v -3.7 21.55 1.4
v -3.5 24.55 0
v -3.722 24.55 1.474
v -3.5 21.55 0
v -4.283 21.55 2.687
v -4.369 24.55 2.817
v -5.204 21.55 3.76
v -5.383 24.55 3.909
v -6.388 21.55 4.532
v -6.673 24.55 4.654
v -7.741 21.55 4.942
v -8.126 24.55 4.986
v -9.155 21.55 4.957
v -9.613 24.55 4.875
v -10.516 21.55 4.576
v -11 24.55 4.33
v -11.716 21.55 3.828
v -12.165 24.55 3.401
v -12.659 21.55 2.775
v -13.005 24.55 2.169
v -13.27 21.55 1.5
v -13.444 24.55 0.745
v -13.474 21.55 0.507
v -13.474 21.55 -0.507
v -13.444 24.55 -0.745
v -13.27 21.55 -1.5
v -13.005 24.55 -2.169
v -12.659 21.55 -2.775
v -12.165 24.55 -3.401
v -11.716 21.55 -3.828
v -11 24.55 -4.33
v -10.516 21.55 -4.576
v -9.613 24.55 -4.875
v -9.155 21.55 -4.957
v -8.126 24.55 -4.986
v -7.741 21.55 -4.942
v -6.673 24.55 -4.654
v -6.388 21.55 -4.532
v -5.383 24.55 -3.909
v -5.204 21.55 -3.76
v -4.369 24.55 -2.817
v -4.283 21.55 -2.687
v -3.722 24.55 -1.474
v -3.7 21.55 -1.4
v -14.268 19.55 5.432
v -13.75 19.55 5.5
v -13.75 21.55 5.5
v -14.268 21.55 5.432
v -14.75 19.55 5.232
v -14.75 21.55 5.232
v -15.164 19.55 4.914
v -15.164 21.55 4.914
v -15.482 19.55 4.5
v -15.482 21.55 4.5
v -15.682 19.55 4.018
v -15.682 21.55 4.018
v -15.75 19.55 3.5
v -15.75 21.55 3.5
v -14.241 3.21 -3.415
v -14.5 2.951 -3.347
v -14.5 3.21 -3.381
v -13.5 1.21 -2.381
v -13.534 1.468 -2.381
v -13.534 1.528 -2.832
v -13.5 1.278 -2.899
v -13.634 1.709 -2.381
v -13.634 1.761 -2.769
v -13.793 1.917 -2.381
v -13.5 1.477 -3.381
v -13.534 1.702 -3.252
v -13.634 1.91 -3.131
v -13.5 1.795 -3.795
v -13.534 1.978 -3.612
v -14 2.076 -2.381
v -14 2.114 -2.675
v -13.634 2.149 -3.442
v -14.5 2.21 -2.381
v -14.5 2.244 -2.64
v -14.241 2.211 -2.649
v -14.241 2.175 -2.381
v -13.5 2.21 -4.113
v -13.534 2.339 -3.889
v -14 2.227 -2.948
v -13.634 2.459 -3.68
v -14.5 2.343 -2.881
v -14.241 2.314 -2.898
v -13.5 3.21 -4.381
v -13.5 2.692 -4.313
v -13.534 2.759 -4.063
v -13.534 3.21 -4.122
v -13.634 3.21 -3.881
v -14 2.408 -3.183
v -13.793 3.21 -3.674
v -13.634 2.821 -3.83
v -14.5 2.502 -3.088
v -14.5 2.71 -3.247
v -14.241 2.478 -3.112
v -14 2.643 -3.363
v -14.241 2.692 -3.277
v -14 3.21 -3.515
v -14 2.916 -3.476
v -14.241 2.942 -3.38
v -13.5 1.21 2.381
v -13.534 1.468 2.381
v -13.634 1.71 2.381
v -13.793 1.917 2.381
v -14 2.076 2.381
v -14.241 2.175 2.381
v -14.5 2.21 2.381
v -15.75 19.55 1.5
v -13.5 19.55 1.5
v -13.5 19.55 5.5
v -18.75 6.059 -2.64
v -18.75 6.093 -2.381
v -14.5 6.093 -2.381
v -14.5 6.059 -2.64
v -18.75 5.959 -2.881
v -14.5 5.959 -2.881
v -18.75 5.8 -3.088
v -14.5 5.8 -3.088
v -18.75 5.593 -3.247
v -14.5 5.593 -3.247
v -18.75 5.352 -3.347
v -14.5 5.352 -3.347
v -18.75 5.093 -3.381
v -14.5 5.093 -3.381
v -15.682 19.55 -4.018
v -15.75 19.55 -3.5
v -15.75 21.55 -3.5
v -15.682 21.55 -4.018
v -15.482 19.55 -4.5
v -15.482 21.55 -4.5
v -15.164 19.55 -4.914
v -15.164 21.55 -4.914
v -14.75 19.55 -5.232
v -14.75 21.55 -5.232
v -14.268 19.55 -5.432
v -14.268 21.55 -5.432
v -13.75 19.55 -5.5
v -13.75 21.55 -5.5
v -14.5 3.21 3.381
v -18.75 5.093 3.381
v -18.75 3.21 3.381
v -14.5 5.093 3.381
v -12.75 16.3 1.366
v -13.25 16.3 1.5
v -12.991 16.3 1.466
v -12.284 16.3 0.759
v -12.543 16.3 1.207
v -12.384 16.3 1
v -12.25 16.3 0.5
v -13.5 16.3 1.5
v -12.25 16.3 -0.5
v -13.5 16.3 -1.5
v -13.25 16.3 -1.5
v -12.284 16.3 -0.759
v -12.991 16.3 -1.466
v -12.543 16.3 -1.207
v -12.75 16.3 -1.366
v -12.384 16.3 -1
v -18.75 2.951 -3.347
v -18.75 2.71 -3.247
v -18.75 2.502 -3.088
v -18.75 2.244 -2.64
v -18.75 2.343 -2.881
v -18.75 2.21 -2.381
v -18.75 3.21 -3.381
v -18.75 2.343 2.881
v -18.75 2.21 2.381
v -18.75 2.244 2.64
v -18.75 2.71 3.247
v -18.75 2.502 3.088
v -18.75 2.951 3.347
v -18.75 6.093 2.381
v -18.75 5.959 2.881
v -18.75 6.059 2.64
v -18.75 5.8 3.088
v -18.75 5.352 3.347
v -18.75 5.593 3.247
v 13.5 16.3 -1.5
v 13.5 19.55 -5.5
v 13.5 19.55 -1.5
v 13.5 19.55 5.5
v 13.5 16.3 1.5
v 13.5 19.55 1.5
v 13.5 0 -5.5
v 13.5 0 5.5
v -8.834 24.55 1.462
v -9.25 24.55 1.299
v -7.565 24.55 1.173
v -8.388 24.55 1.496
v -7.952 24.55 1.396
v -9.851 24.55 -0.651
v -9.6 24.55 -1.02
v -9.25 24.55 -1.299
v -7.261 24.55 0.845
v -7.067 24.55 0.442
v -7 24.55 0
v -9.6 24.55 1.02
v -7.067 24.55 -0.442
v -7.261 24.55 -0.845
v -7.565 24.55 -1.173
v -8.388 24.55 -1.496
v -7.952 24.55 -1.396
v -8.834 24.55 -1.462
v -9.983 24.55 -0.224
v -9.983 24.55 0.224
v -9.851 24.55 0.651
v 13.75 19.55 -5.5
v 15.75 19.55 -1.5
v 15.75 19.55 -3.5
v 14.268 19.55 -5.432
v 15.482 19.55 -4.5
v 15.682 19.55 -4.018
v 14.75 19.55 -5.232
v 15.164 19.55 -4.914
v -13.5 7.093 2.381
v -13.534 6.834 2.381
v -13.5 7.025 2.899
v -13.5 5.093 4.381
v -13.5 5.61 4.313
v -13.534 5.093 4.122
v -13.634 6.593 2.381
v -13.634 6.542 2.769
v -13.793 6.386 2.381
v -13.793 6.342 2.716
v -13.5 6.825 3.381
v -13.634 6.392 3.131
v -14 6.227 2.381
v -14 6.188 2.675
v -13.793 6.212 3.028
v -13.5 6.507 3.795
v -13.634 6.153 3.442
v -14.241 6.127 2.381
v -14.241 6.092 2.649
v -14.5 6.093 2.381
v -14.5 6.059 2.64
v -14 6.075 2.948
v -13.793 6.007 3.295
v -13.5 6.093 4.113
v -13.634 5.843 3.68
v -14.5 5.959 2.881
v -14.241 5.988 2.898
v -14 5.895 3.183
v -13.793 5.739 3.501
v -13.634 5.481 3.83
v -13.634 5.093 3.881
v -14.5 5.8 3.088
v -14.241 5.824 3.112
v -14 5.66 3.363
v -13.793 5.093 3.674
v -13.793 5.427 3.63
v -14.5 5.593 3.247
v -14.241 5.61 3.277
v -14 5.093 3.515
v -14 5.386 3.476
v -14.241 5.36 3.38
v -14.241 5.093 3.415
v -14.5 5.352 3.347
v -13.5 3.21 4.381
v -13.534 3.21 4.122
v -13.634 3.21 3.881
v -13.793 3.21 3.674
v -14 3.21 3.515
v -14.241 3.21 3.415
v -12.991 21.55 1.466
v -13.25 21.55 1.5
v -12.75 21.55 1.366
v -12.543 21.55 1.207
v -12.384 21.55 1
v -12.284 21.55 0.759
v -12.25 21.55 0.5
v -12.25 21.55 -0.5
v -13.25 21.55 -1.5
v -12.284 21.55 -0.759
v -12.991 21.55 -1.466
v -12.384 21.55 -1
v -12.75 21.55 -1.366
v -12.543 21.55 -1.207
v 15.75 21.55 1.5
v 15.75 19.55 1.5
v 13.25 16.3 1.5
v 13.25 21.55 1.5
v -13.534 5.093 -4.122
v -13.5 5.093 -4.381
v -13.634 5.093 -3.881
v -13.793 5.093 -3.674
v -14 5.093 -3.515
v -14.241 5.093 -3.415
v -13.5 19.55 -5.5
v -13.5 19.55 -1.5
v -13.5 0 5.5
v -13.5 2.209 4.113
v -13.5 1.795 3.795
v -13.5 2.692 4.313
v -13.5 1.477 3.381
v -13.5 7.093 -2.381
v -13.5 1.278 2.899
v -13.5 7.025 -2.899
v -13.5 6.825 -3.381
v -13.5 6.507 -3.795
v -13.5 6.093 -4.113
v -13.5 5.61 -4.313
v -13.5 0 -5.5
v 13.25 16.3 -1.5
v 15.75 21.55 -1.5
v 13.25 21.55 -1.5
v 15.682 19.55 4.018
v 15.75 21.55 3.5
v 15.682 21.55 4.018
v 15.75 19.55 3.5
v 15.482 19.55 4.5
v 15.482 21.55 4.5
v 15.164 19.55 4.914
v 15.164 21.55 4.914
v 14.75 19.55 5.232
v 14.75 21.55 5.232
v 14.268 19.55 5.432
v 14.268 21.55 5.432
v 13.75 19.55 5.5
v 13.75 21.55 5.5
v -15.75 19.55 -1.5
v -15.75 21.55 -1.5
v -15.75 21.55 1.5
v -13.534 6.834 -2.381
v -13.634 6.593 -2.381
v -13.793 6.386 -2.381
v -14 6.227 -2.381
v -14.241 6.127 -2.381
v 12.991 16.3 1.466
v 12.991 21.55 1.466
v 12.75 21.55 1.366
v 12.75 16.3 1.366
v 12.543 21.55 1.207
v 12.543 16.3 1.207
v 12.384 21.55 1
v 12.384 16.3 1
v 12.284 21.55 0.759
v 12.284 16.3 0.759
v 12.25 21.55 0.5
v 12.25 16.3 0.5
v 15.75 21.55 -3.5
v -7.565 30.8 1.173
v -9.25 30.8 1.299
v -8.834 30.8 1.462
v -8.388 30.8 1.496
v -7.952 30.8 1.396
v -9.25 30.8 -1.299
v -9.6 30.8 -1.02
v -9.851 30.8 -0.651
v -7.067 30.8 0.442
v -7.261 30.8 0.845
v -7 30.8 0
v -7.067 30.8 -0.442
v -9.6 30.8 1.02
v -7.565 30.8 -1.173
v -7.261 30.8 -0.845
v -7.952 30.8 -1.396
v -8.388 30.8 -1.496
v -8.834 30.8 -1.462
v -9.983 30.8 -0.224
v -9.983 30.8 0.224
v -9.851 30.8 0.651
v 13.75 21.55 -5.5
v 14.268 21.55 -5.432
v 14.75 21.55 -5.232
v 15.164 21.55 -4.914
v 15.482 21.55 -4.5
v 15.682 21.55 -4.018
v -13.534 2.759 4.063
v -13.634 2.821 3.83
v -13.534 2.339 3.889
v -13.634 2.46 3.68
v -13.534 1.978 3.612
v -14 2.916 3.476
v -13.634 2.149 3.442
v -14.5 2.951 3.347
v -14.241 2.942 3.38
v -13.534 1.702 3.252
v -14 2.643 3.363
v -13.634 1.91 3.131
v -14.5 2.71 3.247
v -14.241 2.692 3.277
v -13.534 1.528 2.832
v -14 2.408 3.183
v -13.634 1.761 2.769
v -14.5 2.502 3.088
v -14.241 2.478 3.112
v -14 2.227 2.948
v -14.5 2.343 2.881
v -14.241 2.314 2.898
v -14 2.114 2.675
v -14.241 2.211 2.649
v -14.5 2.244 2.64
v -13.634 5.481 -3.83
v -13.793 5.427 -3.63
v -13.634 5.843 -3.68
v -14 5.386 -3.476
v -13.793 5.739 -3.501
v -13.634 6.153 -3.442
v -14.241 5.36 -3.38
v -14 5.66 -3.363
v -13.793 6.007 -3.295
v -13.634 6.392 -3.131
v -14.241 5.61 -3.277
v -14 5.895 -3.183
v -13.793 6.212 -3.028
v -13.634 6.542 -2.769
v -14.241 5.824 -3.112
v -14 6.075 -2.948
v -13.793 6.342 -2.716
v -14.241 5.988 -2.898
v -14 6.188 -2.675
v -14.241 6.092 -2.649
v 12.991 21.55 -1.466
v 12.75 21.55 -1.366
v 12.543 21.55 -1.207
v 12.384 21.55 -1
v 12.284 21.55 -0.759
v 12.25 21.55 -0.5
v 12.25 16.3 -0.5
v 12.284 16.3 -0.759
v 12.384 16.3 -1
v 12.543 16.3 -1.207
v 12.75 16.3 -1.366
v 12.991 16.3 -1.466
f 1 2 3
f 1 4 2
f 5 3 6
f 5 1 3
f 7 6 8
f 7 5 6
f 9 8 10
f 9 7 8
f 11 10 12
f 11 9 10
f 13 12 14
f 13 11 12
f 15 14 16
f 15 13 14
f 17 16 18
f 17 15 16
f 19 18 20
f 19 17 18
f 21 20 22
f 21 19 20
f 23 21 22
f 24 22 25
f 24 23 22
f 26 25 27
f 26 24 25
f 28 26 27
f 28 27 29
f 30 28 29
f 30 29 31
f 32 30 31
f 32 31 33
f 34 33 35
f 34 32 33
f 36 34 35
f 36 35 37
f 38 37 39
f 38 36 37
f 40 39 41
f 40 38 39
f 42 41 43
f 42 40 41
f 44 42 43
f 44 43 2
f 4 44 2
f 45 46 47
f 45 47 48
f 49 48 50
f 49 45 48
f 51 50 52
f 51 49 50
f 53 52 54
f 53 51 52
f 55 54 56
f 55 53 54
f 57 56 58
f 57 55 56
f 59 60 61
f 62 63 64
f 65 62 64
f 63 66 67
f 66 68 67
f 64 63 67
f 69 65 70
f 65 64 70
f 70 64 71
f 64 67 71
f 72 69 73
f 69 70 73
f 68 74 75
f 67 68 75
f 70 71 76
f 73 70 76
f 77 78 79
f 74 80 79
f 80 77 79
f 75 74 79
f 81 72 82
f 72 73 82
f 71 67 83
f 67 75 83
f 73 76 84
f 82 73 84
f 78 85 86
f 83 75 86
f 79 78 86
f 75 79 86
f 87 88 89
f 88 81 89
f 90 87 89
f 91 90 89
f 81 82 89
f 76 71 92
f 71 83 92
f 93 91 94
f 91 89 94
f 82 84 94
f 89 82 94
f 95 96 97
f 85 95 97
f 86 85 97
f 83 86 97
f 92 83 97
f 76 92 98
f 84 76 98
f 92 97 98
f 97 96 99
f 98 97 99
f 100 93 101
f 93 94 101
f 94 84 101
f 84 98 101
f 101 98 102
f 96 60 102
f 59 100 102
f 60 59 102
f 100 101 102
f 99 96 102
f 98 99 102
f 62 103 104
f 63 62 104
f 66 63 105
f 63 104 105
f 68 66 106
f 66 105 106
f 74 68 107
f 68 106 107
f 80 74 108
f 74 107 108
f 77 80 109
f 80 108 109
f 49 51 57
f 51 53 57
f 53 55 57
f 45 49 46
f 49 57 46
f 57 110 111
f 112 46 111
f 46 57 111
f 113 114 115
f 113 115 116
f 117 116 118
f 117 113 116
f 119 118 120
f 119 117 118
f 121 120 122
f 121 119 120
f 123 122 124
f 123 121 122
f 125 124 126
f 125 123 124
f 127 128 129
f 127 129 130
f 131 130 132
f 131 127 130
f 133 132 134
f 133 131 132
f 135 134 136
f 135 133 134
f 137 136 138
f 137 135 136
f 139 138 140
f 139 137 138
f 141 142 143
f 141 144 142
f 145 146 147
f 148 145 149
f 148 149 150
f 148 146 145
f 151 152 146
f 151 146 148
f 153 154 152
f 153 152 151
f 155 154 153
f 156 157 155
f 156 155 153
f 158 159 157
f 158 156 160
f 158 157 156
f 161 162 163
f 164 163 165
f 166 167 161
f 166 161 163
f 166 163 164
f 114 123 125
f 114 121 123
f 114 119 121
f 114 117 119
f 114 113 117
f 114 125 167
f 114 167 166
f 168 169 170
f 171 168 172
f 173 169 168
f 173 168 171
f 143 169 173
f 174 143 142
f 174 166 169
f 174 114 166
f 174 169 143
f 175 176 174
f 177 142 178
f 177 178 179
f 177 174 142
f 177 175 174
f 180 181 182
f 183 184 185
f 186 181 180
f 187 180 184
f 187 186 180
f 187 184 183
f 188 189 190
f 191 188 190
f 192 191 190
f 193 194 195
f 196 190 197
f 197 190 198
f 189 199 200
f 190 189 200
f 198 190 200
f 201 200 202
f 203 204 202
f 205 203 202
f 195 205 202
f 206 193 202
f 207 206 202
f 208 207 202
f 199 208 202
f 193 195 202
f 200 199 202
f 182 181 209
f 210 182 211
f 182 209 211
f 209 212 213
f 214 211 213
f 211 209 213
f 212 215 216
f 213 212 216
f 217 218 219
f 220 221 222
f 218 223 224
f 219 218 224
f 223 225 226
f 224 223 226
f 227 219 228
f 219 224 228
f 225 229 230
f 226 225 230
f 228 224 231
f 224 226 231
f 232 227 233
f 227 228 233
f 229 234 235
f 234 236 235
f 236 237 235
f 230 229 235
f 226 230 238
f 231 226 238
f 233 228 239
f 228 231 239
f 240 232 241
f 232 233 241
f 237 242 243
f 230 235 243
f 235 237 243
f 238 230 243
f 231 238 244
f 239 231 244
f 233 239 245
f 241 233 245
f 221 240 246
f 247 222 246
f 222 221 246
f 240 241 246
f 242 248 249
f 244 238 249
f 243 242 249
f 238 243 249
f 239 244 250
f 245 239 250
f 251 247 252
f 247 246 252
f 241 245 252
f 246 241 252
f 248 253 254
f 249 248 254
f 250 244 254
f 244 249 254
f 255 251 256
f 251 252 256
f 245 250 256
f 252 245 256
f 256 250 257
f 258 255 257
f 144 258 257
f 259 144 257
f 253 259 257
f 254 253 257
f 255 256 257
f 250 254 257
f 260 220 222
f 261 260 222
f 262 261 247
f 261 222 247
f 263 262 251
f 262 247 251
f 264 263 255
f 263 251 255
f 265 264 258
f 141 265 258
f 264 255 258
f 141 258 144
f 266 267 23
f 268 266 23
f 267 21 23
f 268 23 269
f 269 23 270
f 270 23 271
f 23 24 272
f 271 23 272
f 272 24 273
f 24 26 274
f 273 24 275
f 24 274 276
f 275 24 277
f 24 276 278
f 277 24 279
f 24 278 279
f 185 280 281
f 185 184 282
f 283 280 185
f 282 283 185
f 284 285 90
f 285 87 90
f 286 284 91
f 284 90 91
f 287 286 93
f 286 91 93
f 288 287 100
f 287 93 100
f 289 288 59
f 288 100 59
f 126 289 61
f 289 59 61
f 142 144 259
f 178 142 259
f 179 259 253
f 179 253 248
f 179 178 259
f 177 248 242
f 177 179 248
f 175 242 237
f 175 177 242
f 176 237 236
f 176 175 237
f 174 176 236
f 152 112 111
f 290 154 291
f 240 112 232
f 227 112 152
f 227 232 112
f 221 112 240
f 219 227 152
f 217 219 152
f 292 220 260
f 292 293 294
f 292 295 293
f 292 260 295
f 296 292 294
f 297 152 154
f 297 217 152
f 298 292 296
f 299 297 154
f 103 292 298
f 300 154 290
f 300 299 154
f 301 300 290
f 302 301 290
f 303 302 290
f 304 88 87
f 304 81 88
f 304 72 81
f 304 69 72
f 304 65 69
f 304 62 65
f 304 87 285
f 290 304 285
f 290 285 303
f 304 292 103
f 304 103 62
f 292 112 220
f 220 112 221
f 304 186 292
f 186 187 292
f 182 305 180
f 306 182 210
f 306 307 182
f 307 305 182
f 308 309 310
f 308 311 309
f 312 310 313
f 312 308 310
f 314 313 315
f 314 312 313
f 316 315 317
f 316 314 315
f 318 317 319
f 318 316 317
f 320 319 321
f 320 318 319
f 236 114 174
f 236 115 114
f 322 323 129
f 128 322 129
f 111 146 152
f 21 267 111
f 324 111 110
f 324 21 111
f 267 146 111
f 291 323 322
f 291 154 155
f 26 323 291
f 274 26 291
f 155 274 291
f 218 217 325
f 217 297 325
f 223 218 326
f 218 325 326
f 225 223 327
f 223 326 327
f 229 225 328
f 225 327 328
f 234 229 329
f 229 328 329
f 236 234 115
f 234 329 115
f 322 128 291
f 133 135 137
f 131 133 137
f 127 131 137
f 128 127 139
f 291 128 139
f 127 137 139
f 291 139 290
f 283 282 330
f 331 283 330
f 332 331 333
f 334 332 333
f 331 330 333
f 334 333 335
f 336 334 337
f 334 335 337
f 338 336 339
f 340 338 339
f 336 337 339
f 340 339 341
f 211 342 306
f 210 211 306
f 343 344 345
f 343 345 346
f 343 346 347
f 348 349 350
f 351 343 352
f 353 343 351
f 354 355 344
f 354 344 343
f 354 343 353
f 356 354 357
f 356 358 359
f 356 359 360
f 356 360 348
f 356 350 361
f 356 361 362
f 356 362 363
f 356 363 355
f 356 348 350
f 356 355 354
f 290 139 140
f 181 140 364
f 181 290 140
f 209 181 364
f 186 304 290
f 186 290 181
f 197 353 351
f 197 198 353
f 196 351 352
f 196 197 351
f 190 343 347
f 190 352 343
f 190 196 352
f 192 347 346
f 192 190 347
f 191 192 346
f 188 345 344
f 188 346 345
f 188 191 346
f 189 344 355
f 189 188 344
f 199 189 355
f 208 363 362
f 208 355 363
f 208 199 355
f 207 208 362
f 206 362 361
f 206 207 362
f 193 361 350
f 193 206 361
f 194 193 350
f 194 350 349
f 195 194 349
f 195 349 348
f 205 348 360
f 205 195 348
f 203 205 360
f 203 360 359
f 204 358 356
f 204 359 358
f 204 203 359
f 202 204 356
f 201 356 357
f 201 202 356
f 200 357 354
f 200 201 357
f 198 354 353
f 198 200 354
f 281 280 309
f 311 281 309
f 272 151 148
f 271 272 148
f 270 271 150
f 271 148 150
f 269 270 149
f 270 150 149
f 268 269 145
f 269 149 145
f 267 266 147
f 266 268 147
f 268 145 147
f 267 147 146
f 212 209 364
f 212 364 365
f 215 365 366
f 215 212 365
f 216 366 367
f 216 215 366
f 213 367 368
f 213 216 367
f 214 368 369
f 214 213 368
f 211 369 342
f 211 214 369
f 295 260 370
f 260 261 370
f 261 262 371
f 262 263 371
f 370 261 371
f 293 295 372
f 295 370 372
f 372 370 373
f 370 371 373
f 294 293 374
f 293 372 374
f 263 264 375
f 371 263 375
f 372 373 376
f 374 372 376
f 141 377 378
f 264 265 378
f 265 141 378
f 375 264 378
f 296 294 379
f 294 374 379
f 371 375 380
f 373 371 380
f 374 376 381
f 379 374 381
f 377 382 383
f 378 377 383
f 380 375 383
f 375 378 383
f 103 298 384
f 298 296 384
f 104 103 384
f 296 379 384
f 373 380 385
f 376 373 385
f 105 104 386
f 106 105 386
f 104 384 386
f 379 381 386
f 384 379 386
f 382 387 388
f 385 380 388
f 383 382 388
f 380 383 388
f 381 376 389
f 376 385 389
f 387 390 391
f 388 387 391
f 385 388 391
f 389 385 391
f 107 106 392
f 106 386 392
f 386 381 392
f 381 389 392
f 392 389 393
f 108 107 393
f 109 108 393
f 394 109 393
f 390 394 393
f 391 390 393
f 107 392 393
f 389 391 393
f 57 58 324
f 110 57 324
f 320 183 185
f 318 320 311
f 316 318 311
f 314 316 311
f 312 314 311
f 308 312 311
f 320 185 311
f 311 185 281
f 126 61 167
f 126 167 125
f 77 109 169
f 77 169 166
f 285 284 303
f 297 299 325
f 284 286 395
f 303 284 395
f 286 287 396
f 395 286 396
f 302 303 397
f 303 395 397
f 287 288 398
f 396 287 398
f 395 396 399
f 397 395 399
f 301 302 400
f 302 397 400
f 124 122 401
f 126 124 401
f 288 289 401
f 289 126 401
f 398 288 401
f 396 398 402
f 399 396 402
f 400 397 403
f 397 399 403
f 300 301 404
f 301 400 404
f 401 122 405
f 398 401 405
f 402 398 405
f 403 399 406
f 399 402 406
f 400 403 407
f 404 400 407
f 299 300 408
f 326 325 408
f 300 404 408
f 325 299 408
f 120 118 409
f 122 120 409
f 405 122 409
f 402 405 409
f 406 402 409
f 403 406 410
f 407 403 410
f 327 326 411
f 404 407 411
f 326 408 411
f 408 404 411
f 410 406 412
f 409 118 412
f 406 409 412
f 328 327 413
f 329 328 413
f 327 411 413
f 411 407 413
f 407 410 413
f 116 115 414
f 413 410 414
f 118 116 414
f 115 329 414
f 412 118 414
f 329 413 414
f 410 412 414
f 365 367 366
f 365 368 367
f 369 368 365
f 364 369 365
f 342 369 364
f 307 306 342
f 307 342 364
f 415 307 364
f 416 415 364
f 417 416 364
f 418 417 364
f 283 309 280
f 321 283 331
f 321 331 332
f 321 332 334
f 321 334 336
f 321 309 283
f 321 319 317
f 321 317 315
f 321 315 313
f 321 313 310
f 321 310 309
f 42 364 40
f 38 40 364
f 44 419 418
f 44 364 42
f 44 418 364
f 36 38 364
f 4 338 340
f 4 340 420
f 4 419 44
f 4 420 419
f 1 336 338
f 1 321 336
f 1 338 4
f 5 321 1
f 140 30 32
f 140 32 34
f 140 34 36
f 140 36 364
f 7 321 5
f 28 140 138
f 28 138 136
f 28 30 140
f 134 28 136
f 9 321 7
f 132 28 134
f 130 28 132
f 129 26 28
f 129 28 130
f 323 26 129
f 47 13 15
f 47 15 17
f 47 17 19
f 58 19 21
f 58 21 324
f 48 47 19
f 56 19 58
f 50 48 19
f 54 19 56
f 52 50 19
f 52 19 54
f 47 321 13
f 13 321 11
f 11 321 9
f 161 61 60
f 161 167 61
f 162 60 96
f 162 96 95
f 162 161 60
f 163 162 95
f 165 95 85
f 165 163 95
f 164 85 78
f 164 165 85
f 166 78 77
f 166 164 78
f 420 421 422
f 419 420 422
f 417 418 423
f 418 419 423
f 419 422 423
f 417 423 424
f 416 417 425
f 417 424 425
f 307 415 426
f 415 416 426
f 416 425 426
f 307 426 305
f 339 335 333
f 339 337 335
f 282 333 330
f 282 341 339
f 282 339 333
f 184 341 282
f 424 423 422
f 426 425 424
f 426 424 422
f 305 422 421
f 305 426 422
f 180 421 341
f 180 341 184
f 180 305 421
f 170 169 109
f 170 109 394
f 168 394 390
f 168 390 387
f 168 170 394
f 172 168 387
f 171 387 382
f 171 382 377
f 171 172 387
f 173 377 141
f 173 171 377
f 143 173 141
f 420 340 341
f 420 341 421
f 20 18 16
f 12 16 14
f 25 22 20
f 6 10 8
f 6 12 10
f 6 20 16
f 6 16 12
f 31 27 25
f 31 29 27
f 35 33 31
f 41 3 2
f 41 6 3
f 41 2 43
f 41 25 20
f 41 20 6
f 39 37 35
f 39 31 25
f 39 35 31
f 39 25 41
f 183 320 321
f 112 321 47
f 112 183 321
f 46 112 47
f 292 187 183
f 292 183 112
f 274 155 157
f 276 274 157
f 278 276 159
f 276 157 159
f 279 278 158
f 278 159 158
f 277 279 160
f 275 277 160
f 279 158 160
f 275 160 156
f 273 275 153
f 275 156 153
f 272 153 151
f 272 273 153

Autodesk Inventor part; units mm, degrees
ref_plane "YZ Plane" through (0, 0, 0) normal (1, 0, 0) x (0, 1, 0)
ref_plane "XZ Plane" through (0, 0, 0) normal (0, 1, 0) x (-1, 0, 0)
ref_plane "XY Plane" through (0, 0, 0) normal (0, 0, 1) x (1, 0, 0)
sketch "Skizze1" plane through (0, 0, 0) normal (0, 1, 0) x (-1, 0, 0)
  line L0 (-13.5, 5.5) -> (13.5, 5.5)
  line L1 (13.5, 5.5) -> (13.5, -5.5)
  line L2 (13.5, -5.5) -> (-13.5, -5.5)
  line L3 (-13.5, -5.5) -> (-13.5, 5.5)
  line L4 (-13.5, 5.5) -> (13.5, -5.5) construction
  line L5 (13.5, 5.5) -> (-13.5, -5.5) construction
  point P0 (0, 0)
  dimension "d0" = 27
  dimension "d1" = 11
extrude "Extrusion1" add sketch "Skizze1" along normal blind 21.55
sketch "Skizze2" plane through (0, 21.55, 0) normal (0, 1, 0) x (1, 0, 0)
  line L0 (15.75, -5.5) -> (-15.75, -5.5)
  line L1 (-15.75, -5.5) -> (-15.75, 5.5)
  line L2 (-15.75, 5.5) -> (15.75, 5.5)
  line L3 (15.75, 5.5) -> (15.75, -5.5)
  line L4 (15.75, -5.5) -> (-15.75, 5.5) construction
  line L5 (-15.75, -5.5) -> (15.75, 5.5) construction
  line L6 (13.5, 5.5) -> (-13.5, 5.5) projected
  point P0 (0, 0)
  dimension "d4" = 31.5
extrude "Extrusion2" add sketch "Skizze2" against normal blind 2
fillet "Rundung1" radius 2 4 edges at (-15.75, 20.55, 5.5) (15.75, 20.55, 5.5) (15.75, 20.55, -5.5) (-15.75, 20.55, -5.5)
sketch "Skizze3" plane through (0, 21.55, 0) normal (0, 1, 0) x (1, 0, 0)
  circle A0 centre (-8.5, 0) radius 5
  line L0 (-13.5, -5.5) -> (-13.5, 5.5) projected
  point P0 (0, 0)
  dimension "d8" = 5
  dimension "d9" = 10
extrude "Extrusion3" add sketch "Skizze3" along normal blind 3
sketch "Skizze4" plane through (-8.5, 24.55, 0) normal (0, 1, 0) x (1, 0, 0)
  circle A0 centre (0, 0) radius 1.5
  circle A1 centre (0, 0) radius 5 projected
  point P0 (8.5, 0)
  dimension "d12" = 3
extrude "Extrusion4" add sketch "Skizze4" along normal blind 6.25 separate body contours A0
sketch "Skizze5" plane through (0, 21.55, 0) normal (0, 1, 0) x (1, 0, 0)
  line L0 (19.25, -1.5) -> (12.25, -1.5)
  line L1 (12.25, -1.5) -> (12.25, 1.5)
  line L2 (12.25, 1.5) -> (19.25, 1.5)
  line L3 (19.25, 1.5) -> (19.25, -1.5)
  line L4 (15.75, -3.5) -> (15.75, 3.5) projected
  line L5 (19.25, -1.5) -> (12.25, 1.5) construction
  line L6 (12.25, -1.5) -> (19.25, 1.5) construction
  line L7 (-12.25, -1.5) -> (-19.25, -1.5)
  line L8 (-19.25, -1.5) -> (-19.25, 1.5)
  line L9 (-19.25, 1.5) -> (-12.25, 1.5)
  line L10 (-12.25, 1.5) -> (-12.25, -1.5)
  line L11 (-15.75, -3.5) -> (-15.75, 3.5) projected
  line L12 (-12.25, -1.5) -> (-19.25, 1.5) construction
  line L13 (-19.25, -1.5) -> (-12.25, 1.5) construction
  point P0 (0, 0)
  point P1 (15.75, 0)
  point P2 (-15.75, 0)
  dimension "d15" = 3
  dimension "d16" = 3
  dimension "d17" = 3.5
  dimension "d18" = 3.5
extrude "Extrusion5" cut sketch "Skizze5" against normal blind 5.25 bodies 1
fillet "Rundung2" radius 1 4 edges at (-12.25, 18.925, 1.5) (-12.25, 18.925, -1.5) (12.25, 18.925, 1.5) (12.25, 18.925, -1.5)
sketch "Skizze6" plane through (-13.5, 0, -5.5) normal (-1, 0, 0) x (0, 0, 1)
  line L0 (2.1189, 6.0927) -> (8.8811, 6.0927)
  line L1 (8.8811, 6.0927) -> (8.8811, 2.2095)
  line L2 (8.8811, 2.2095) -> (2.1189, 2.2095)
  line L3 (2.1189, 2.2095) -> (2.1189, 6.0927)
  line L4 (2.1189, 6.0927) -> (8.8811, 2.2095) construction
  line L5 (8.8811, 6.0927) -> (2.1189, 2.2095) construction
  point P0 (5.5, 0)
  point P1 (5.5, 4.1511)
extrude "Extrusion6" add sketch "Skizze6" along normal blind 5.25 bodies 1
fillet "Rundung3" radius 1 4 edges at (-16.125, 6.0927, -3.3811) (-16.125, 2.2095, -3.3811) (-16.125, 2.2095, 3.3811) (-16.125, 6.0927, 3.3811)
fillet "Rundung4" radius 1 8 edges at (-13.5, 5.7998, 3.0882) (-13.5, 4.1511, 3.3811) (-13.5, 2.5023, 3.0882) (-13.5, 2.2095, 0) (-13.5, 2.5023, -3.0882) (-13.5, 4.1511, -3.3811) (-13.5, 5.7998, -3.0882) (-13.5, 6.0927, 0)
properties part number "P_Servo_SIMPROP_27x12"
